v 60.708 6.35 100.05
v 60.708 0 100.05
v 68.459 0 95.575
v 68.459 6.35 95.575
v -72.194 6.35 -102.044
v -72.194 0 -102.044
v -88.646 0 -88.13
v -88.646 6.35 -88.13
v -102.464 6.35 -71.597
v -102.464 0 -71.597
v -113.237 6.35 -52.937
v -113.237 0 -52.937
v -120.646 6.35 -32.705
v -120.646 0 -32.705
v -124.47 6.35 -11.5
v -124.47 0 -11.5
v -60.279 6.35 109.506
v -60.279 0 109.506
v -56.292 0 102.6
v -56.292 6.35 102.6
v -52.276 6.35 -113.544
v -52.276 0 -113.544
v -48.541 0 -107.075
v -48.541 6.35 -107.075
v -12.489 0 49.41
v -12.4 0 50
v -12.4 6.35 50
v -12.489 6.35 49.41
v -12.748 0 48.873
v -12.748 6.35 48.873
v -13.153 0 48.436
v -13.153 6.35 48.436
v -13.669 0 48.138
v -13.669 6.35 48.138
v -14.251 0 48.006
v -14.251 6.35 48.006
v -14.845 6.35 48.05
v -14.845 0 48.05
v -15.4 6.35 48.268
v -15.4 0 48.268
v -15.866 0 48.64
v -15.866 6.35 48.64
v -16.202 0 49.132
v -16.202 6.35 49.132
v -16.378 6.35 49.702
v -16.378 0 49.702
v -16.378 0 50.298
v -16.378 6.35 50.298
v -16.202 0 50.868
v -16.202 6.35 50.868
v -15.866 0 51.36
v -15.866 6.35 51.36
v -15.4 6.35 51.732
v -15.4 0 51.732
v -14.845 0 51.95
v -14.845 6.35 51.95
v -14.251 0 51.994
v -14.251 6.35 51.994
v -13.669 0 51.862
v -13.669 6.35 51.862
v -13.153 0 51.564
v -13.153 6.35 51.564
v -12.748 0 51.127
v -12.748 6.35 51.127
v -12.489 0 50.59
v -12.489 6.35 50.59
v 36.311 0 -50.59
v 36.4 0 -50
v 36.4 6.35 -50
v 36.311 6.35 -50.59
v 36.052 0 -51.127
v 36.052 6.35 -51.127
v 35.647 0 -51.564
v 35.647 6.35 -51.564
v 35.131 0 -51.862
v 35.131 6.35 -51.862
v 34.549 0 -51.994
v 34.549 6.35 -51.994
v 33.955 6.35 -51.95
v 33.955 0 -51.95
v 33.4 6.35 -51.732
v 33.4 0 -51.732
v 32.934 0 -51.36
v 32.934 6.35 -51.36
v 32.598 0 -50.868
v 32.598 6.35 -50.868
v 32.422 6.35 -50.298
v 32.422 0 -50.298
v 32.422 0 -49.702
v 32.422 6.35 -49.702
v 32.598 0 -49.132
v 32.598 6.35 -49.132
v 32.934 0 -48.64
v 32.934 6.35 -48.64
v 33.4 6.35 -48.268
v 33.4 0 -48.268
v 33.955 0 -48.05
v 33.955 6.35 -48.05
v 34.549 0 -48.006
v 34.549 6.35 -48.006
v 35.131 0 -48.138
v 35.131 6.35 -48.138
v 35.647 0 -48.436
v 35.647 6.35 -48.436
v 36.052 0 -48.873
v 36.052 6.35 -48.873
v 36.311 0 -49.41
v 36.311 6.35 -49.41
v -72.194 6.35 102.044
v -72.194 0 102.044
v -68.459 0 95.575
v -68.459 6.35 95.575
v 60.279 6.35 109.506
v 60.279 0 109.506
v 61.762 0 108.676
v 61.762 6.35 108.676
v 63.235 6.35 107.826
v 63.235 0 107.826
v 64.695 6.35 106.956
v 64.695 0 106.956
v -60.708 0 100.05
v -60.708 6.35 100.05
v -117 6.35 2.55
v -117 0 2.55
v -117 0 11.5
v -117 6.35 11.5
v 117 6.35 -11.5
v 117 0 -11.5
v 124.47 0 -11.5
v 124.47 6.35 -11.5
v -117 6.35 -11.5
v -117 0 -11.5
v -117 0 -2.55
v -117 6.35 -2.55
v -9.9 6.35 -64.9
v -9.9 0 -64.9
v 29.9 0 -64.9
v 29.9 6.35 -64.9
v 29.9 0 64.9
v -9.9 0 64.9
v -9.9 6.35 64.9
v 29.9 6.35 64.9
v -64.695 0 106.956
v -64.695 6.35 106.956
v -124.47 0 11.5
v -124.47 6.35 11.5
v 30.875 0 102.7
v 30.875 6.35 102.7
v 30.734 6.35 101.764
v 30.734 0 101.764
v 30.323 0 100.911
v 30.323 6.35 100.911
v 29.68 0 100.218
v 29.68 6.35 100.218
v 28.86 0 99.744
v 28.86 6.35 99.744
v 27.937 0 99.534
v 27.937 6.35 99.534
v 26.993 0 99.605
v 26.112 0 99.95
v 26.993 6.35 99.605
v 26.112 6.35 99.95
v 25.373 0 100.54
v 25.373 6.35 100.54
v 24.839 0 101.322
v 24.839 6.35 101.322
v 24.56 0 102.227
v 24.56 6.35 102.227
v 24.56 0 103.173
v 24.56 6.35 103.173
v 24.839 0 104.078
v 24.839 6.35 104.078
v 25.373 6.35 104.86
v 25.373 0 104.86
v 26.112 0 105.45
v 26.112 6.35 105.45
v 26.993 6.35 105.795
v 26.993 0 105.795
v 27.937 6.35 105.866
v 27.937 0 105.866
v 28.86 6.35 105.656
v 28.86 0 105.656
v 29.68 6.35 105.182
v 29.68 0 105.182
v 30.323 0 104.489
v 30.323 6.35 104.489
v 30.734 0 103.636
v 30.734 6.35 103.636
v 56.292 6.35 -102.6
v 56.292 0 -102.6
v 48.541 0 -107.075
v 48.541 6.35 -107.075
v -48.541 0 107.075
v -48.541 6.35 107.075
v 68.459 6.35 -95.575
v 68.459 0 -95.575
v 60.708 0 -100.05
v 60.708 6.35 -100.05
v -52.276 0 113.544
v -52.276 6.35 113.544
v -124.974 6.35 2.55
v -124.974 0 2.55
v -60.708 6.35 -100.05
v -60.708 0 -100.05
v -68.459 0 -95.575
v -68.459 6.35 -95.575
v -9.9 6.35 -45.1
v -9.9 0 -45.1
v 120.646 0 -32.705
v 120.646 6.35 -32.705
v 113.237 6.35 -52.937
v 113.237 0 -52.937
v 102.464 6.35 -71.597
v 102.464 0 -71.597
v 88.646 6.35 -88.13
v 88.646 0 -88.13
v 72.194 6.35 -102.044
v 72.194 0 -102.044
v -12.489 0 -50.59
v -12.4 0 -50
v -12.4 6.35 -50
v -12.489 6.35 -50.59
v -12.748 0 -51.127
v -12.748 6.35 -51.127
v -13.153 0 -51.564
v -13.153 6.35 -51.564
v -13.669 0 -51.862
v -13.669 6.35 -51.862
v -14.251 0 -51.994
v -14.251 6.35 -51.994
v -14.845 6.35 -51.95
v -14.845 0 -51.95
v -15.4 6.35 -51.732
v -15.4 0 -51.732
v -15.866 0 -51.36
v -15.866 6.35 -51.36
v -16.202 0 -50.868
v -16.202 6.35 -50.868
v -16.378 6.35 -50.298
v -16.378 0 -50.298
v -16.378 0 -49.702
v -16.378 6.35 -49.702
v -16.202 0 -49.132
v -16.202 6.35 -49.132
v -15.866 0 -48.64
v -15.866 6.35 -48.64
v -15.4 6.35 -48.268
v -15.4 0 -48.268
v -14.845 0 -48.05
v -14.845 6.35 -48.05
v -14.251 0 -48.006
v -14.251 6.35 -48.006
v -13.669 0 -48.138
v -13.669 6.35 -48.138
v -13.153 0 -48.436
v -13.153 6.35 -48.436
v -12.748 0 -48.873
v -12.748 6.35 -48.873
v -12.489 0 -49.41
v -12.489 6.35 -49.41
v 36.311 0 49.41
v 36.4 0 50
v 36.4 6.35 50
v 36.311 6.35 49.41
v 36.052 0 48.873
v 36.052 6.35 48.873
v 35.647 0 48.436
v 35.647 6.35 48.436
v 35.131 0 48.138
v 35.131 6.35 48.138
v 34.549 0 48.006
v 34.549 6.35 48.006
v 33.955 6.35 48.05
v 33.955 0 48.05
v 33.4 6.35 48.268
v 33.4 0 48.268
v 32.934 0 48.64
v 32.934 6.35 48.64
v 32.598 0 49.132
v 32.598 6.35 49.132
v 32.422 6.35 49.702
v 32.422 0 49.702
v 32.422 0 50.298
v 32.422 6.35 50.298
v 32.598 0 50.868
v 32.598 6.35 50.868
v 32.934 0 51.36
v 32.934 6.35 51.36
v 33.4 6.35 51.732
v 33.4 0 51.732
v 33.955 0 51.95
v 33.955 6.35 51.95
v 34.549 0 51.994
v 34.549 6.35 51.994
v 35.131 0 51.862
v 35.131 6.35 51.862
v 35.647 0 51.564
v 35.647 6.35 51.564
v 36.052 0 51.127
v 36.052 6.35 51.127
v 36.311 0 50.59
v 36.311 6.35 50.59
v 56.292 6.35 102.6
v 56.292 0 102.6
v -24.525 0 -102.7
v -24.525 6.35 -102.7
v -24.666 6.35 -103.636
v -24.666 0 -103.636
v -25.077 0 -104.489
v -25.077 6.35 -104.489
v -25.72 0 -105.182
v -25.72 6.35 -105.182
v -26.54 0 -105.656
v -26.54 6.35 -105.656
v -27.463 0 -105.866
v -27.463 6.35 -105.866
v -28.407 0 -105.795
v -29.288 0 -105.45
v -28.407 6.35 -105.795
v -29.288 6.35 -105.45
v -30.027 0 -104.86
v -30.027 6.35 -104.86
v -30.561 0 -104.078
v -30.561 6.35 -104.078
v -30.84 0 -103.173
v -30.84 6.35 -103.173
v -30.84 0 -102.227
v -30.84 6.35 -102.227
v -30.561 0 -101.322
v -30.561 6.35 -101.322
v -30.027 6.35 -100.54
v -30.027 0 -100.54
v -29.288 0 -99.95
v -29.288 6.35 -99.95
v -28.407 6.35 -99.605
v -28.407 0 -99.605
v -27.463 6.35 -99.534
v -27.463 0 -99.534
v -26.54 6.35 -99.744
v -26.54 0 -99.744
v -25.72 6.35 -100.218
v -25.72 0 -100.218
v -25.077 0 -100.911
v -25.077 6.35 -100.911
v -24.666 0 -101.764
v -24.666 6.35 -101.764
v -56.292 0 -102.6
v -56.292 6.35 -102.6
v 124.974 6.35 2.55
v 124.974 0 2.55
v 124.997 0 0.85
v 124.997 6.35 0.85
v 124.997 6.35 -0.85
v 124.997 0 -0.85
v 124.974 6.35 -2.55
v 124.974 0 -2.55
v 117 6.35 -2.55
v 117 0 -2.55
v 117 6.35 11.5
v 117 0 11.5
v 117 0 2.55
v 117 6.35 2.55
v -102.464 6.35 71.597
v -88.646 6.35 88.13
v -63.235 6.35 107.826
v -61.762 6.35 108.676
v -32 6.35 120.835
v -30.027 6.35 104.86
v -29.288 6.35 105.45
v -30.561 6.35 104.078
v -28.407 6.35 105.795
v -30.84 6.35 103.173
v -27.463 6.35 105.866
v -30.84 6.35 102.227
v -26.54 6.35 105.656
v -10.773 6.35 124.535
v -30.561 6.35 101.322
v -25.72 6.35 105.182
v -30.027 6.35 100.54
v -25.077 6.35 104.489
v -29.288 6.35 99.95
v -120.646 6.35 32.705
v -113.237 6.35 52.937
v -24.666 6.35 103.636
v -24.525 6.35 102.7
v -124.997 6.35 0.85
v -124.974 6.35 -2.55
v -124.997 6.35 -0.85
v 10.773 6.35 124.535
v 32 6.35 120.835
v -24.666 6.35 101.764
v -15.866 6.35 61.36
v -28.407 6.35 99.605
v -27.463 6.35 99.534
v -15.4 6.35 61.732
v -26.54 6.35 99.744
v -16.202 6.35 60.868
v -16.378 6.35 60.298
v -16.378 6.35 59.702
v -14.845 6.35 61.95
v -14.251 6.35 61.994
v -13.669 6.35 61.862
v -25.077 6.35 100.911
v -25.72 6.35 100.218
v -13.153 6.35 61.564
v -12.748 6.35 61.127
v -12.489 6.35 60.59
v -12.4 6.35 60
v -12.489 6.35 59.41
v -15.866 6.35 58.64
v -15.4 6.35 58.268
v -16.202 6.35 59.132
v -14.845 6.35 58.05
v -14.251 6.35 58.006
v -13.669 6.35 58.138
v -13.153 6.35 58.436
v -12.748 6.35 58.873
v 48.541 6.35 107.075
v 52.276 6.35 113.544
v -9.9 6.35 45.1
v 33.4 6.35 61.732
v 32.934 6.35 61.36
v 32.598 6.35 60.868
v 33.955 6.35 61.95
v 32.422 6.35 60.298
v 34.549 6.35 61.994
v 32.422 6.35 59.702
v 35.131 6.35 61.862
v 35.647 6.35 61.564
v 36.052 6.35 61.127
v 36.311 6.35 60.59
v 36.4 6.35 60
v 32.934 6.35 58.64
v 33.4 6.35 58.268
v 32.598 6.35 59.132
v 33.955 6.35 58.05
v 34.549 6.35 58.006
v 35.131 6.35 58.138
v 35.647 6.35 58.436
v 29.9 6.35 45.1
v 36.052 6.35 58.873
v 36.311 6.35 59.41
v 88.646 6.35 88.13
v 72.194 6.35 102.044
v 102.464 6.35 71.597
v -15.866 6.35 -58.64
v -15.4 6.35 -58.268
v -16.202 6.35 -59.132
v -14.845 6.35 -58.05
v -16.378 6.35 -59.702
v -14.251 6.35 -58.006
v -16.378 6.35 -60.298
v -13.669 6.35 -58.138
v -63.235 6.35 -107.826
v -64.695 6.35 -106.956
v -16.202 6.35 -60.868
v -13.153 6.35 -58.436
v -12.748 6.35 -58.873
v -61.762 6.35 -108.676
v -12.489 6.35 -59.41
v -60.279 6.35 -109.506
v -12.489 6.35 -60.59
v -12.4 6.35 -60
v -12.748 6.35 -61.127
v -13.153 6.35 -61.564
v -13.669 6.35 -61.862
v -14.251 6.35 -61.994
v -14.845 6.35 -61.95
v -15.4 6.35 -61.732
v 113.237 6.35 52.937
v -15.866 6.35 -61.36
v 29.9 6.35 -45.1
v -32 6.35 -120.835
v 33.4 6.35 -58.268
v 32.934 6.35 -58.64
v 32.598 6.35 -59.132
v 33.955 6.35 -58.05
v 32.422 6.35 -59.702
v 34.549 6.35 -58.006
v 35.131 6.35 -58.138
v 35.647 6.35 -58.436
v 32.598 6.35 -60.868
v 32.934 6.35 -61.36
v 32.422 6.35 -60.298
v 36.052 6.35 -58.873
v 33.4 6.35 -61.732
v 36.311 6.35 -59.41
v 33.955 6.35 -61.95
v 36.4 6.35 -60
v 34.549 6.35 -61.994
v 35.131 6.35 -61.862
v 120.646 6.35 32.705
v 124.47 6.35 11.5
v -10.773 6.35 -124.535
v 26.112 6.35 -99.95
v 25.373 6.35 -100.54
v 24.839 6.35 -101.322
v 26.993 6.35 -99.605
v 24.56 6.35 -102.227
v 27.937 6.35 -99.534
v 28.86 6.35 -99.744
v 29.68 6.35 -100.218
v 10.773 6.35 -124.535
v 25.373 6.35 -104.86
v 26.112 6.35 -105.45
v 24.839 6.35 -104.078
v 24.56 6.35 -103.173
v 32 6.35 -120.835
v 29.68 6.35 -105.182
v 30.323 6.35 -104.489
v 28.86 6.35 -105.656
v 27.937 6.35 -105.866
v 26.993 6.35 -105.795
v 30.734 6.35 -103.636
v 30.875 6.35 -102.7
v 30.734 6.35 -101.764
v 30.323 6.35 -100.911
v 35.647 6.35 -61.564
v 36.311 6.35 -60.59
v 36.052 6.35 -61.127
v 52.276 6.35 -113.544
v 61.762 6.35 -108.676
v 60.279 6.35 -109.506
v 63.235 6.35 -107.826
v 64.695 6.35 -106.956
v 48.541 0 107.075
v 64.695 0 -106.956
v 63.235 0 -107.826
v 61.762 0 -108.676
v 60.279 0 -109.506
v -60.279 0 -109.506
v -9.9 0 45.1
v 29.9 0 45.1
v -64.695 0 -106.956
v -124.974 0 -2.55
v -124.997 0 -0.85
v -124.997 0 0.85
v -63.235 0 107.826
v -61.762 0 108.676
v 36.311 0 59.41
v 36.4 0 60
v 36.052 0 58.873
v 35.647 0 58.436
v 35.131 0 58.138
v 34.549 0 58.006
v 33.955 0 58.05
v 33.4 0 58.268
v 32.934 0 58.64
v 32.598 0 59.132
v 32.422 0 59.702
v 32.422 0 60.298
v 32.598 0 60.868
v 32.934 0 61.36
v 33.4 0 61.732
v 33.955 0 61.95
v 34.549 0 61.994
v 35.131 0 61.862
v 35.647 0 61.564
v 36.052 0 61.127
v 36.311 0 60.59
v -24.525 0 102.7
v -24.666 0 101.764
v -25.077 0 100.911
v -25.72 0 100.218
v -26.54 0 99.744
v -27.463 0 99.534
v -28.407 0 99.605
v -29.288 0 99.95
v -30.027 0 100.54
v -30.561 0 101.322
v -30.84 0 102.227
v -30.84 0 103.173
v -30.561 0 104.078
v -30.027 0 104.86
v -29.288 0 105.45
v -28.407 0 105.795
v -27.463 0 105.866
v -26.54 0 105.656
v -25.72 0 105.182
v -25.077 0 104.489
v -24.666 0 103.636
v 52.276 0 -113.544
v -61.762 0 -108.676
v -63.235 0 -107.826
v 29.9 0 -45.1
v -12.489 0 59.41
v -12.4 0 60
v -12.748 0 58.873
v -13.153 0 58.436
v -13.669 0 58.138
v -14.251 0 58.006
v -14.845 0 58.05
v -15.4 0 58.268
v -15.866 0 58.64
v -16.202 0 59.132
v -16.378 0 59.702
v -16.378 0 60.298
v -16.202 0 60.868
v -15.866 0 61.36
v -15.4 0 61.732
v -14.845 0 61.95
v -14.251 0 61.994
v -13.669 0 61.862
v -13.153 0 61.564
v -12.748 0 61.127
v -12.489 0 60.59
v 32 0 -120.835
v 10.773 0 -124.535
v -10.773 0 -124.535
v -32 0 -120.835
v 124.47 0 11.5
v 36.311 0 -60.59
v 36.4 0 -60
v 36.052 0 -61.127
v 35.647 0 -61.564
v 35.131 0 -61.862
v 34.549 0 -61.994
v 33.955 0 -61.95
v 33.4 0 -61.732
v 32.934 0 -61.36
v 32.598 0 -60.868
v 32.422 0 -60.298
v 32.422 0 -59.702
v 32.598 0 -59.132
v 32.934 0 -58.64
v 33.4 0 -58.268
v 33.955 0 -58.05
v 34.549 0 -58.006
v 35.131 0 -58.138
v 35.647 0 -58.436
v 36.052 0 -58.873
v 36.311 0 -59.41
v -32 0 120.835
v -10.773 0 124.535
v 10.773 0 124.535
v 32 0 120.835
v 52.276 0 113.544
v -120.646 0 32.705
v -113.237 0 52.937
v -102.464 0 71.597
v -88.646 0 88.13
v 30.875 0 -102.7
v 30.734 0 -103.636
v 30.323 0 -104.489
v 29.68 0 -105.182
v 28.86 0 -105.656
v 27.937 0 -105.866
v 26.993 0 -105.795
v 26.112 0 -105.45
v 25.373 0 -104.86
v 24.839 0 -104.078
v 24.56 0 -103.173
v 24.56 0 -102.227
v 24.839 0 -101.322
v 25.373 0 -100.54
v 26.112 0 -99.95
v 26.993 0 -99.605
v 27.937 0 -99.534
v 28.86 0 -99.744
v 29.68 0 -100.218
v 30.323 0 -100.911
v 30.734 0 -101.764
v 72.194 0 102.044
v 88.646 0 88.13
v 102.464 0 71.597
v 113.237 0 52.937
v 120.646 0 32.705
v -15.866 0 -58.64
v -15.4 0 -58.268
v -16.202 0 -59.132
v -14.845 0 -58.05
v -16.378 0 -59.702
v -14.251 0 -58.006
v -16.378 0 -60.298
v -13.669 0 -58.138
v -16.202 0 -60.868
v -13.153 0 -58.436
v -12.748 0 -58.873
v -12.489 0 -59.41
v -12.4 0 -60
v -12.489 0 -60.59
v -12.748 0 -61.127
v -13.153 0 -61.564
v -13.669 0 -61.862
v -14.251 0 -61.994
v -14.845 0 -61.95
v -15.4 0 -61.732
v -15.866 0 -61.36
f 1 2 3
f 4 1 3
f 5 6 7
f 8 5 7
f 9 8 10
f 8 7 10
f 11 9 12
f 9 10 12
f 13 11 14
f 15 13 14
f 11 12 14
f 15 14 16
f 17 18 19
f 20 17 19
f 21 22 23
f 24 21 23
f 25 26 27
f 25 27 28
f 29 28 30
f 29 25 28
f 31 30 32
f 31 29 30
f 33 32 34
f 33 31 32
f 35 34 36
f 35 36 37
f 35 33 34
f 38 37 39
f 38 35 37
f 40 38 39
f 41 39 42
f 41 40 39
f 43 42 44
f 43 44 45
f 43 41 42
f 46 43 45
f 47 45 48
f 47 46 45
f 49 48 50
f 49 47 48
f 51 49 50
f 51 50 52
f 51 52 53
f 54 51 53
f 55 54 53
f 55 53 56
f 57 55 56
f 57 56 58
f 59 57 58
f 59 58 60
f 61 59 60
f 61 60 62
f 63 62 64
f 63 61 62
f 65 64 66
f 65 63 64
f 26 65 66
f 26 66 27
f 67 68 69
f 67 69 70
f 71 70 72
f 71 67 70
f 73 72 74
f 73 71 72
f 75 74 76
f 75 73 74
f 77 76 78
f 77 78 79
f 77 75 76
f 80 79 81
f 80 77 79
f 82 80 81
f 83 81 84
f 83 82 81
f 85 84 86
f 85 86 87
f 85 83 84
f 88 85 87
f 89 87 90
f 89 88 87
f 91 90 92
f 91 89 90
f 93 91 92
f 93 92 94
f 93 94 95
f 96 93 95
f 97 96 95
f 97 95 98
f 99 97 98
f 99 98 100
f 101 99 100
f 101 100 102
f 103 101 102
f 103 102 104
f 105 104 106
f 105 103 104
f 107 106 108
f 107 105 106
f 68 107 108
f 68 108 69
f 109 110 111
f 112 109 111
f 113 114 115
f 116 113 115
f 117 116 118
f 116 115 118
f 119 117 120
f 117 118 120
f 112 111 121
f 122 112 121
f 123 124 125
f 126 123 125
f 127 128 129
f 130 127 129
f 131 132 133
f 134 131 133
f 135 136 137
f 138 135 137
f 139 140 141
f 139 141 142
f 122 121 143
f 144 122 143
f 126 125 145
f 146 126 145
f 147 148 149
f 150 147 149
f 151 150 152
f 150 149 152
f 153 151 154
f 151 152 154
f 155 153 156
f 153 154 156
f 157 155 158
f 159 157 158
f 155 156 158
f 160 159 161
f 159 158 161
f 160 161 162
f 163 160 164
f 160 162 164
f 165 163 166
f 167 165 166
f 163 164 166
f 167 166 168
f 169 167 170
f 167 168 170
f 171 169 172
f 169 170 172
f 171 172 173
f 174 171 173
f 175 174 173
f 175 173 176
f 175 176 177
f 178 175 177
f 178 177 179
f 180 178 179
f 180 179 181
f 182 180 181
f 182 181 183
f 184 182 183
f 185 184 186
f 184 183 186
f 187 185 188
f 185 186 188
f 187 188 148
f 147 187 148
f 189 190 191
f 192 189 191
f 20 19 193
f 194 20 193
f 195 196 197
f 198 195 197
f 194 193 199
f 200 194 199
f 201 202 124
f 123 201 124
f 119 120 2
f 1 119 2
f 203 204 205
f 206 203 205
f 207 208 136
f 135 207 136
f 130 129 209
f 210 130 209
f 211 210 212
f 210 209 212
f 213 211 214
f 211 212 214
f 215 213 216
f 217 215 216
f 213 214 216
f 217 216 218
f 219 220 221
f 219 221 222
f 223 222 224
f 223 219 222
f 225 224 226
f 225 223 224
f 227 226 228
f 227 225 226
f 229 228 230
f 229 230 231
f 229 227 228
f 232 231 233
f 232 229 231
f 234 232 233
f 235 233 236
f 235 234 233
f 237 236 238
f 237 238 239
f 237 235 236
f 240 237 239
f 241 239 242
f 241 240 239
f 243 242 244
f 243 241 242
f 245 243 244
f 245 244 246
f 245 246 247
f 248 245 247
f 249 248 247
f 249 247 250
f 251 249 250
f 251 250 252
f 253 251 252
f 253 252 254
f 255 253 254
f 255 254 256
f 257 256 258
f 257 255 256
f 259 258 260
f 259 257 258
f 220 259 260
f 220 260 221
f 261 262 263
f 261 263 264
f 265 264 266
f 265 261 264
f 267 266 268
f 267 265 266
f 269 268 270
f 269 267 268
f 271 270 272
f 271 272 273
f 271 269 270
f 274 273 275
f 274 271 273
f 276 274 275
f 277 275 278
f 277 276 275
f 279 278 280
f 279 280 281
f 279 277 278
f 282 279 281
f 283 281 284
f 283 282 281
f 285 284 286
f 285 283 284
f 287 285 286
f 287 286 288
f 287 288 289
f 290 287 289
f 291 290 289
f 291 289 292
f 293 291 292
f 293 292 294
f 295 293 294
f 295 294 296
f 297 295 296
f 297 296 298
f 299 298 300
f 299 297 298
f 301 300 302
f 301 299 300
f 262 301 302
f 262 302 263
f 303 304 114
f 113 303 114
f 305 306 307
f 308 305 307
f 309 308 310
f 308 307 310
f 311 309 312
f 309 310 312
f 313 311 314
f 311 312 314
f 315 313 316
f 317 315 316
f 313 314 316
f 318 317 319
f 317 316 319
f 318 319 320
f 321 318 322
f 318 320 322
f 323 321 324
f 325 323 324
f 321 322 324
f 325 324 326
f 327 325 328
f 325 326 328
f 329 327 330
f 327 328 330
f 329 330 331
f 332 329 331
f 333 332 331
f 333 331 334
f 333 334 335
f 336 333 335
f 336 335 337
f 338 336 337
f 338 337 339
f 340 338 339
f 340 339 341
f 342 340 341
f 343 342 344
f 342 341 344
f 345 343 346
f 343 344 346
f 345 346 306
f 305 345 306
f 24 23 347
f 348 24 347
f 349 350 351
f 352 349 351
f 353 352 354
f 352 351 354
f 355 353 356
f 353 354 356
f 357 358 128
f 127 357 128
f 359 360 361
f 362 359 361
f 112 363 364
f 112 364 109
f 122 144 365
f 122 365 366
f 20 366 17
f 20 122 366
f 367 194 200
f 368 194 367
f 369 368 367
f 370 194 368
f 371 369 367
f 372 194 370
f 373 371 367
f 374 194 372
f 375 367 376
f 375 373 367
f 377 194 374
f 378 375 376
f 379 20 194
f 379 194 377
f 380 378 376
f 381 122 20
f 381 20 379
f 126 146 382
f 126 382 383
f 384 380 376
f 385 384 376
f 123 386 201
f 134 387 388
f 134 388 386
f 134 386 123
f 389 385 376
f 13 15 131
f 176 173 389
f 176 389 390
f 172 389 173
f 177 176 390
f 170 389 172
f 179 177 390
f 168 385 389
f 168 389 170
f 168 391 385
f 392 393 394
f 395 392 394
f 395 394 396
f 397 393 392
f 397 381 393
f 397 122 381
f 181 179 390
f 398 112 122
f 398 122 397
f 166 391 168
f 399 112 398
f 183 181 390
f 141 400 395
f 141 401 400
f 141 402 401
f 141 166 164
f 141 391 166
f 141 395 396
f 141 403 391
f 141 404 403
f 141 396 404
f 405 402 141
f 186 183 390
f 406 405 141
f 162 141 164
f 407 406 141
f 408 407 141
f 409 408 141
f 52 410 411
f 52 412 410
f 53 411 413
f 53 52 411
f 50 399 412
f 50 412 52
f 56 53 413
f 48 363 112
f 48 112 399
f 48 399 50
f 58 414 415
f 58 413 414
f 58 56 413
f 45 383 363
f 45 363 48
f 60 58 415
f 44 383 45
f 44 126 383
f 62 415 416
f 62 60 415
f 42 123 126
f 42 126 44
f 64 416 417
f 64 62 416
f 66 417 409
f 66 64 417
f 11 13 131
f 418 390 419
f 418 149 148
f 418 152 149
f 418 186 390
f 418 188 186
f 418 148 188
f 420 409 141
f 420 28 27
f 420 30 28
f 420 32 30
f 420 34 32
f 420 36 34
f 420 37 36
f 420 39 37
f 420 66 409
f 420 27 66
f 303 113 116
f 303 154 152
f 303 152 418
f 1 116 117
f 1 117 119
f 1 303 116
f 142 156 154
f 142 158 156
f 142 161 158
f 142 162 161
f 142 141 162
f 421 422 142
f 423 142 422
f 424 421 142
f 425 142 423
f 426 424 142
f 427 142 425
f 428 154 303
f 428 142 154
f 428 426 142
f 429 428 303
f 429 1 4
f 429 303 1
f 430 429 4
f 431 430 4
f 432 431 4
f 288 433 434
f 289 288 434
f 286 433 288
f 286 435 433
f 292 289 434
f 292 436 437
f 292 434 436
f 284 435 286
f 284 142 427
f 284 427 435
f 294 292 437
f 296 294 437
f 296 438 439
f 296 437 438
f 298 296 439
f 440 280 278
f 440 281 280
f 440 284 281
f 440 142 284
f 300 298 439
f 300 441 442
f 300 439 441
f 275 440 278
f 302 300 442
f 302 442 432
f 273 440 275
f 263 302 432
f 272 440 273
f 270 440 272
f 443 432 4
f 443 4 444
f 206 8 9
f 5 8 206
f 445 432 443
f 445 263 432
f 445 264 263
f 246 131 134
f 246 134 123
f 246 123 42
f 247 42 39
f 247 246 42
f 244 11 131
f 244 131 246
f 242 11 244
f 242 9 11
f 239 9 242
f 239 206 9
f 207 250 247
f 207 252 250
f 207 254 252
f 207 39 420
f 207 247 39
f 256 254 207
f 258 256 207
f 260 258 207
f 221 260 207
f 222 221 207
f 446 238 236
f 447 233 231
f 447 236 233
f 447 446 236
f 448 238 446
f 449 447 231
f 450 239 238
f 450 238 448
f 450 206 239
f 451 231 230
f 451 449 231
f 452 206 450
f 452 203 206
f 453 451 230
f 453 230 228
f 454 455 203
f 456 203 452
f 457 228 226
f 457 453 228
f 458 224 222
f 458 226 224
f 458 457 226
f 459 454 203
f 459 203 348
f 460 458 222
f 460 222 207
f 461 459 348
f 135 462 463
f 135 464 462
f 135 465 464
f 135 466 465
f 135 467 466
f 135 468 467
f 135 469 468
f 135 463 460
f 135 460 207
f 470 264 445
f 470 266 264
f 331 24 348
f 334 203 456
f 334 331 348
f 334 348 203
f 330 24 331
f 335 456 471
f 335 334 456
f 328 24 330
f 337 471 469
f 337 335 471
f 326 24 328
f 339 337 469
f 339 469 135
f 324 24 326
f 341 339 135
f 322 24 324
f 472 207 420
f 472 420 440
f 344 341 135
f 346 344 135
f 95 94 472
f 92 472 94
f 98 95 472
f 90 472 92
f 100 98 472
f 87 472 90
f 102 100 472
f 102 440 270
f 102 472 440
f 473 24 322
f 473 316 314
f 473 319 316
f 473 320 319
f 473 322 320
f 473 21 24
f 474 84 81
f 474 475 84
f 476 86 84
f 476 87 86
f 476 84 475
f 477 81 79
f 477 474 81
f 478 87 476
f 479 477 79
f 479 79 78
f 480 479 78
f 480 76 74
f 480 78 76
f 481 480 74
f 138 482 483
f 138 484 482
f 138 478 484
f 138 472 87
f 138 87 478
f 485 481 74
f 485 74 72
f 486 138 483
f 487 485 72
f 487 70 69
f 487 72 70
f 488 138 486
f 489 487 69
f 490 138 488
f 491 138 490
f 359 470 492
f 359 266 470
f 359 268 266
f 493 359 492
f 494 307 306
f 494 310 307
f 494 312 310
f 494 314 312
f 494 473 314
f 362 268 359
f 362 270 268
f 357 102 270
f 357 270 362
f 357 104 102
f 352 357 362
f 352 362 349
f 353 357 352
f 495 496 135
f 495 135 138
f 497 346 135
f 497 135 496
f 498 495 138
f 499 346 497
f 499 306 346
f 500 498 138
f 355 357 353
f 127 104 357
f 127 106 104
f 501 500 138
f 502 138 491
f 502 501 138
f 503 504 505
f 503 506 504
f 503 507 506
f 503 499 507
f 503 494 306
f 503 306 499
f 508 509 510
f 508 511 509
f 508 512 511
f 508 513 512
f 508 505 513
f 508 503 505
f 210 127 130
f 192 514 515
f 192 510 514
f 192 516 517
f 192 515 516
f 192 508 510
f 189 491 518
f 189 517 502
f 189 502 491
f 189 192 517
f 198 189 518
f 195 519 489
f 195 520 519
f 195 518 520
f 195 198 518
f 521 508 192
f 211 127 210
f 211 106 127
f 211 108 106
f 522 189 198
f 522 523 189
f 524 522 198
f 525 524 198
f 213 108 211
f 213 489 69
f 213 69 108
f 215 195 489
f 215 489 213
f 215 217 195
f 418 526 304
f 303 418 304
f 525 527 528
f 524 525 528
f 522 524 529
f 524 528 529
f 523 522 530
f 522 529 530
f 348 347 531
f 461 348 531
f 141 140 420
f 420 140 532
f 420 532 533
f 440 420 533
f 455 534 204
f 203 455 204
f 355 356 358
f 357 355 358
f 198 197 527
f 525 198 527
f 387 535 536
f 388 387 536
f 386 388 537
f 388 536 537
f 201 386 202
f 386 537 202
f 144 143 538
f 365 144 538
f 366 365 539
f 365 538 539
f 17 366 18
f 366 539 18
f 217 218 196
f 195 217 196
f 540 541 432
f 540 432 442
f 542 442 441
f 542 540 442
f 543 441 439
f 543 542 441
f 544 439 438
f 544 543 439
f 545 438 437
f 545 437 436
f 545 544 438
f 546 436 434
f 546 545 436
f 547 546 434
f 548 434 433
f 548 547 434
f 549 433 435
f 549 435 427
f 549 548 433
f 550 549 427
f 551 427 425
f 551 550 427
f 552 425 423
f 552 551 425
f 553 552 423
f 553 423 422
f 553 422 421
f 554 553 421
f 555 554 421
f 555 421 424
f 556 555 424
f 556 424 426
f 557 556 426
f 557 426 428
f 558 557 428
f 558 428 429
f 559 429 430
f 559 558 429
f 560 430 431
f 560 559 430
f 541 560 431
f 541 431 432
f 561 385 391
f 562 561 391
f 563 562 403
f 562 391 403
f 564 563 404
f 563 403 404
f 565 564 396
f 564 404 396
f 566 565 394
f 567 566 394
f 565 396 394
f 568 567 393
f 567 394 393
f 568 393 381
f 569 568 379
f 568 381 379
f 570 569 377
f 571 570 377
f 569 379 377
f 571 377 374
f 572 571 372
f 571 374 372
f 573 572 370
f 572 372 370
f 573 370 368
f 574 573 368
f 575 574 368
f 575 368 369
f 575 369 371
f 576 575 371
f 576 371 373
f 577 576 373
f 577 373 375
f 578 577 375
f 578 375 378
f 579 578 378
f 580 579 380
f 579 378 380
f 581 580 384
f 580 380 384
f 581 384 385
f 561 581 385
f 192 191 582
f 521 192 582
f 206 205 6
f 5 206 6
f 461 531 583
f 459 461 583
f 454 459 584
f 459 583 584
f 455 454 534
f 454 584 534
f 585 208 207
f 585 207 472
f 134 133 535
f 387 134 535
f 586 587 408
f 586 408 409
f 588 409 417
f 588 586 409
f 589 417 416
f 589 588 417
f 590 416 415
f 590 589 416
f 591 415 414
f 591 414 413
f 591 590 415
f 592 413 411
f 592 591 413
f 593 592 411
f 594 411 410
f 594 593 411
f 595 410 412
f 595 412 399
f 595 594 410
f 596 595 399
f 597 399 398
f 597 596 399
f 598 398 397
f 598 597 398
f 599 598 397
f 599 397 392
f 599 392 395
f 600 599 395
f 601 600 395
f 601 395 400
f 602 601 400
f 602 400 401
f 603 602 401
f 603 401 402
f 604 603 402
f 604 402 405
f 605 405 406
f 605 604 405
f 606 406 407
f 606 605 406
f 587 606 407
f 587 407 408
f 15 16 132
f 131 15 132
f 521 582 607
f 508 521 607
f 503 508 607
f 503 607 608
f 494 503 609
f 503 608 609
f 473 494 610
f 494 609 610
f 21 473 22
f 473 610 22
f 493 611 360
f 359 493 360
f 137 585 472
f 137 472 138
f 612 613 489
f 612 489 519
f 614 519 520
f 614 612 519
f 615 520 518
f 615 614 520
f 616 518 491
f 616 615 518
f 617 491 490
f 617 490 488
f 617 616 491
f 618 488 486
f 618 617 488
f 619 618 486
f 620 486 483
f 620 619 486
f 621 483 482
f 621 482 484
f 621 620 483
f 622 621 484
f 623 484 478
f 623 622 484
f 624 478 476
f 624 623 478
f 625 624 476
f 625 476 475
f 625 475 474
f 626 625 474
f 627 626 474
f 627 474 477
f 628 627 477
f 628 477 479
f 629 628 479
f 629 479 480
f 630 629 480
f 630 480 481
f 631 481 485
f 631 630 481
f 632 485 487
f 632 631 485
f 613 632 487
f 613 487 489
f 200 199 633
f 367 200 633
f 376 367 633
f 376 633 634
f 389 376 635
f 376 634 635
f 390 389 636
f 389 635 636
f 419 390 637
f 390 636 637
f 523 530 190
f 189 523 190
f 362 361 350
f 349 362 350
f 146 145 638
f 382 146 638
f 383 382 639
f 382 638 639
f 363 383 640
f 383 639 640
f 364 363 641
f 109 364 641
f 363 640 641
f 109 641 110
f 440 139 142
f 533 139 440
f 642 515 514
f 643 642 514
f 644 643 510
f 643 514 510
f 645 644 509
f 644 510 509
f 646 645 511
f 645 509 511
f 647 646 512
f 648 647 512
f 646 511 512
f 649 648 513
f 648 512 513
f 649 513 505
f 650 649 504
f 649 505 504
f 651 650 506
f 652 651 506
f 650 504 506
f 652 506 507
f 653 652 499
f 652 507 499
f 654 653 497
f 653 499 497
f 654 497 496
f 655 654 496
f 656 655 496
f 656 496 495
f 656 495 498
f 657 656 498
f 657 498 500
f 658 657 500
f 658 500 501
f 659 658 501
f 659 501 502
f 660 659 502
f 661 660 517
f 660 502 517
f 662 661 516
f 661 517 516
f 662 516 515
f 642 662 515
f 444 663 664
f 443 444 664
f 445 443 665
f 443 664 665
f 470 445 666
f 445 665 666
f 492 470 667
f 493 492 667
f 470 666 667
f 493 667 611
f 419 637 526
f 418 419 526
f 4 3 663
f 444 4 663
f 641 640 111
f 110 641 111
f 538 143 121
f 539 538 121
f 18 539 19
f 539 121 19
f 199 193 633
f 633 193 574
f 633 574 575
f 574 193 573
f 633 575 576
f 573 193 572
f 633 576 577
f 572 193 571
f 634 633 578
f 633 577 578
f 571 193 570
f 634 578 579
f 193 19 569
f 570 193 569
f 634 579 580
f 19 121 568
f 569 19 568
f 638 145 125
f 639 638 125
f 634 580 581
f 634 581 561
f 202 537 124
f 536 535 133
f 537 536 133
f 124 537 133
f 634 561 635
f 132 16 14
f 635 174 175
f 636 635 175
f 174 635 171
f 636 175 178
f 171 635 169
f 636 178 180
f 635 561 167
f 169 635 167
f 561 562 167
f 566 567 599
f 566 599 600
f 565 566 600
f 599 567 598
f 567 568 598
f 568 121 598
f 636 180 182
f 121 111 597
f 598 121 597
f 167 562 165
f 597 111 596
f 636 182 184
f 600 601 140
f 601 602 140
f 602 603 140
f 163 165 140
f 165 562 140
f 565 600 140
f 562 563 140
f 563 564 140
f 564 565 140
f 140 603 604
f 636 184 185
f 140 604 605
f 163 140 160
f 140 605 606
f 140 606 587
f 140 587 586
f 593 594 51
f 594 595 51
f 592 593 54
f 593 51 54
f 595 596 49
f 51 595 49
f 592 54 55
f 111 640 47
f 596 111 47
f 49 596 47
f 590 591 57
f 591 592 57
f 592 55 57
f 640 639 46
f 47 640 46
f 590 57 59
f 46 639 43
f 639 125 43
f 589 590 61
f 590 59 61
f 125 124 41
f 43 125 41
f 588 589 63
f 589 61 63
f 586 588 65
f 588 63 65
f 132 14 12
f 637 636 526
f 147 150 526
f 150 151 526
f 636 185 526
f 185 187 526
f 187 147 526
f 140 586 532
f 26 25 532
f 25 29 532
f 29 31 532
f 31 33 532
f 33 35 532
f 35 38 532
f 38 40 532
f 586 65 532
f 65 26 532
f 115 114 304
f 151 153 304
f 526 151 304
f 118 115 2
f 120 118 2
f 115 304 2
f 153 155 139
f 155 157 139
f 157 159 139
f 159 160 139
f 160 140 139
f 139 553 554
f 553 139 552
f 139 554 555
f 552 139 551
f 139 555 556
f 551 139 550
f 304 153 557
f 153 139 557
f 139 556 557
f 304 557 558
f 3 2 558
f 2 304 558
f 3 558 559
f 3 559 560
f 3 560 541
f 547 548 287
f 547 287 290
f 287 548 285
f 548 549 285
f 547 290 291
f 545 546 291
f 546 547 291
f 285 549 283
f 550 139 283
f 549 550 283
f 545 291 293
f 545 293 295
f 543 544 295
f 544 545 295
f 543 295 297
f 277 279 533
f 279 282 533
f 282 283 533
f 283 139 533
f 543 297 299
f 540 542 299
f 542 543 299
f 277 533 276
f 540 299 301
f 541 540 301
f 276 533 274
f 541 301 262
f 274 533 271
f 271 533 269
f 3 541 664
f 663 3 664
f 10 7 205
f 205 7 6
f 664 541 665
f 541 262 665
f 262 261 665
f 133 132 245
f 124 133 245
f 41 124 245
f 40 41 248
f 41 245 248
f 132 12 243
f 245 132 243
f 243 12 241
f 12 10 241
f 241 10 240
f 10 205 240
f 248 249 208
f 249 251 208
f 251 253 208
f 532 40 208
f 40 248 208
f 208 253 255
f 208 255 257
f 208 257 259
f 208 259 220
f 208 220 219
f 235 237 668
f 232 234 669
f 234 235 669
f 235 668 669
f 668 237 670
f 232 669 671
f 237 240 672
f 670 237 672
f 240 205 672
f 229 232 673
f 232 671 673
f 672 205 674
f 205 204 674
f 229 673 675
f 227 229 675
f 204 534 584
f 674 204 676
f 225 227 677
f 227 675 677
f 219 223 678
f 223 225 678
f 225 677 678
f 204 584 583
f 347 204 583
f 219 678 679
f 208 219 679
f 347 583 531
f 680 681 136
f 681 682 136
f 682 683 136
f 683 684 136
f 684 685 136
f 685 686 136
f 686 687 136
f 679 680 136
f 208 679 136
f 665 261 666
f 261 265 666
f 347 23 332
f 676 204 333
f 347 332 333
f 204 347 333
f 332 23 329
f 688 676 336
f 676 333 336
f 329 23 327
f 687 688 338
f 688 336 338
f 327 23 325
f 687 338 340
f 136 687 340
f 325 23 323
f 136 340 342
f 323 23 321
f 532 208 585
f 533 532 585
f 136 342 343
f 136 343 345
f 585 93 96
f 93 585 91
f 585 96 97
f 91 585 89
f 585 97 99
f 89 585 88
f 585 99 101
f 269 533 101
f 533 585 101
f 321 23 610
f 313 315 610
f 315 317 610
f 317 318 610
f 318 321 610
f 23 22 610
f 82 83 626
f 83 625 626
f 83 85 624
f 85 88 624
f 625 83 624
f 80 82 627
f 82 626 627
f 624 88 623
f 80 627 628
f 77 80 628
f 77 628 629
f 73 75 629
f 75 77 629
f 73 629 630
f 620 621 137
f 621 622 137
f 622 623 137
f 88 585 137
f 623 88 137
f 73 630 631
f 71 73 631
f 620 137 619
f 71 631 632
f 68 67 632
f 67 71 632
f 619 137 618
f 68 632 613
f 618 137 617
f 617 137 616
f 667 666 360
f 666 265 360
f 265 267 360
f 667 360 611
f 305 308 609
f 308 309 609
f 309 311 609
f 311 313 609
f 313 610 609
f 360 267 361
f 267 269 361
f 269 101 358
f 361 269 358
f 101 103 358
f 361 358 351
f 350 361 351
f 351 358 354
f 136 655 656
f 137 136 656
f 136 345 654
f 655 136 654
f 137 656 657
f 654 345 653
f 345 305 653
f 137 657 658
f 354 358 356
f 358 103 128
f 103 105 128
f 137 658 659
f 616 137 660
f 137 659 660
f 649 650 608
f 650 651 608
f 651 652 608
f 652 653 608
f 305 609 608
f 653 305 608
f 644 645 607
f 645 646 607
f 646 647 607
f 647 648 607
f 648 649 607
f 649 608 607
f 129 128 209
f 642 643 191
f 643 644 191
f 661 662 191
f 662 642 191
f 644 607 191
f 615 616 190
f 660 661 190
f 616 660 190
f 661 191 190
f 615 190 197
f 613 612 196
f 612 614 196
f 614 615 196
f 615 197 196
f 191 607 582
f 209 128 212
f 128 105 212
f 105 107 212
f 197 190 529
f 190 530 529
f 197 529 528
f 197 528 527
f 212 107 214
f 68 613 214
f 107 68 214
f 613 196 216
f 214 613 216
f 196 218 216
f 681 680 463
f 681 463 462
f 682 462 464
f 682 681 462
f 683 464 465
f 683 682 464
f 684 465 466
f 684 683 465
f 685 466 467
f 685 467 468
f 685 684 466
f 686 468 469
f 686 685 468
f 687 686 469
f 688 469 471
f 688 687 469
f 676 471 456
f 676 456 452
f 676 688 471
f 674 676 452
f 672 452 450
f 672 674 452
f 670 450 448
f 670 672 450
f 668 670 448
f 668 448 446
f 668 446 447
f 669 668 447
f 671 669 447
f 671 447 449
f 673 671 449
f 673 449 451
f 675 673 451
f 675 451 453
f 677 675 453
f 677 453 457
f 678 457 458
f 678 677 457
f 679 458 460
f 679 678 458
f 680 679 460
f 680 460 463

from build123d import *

# Parameters (mm, degrees)
SKETCH1_R           = 2
SKETCH1_W           = 39.8
SKETCH1_H           = 19.8
BOSS_EXTRUDE1_DEPTH = 6.35
SKETCH3_R           = 3.175
CUT_EXTRUDE1_DEPTH  = 6.35


with BuildPart() as part:
    # Sketch1 → Boss-Extrude1 (new body)
    with BuildSketch(Plane(origin=(0, 0, 0), x_dir=(1, 0, 0), z_dir=(0, 1, 0))):
        with BuildLine():
            Line((-124.469875874, 11.5), (-117, 11.5))
            Line((-117, 11.5), (-117, 2.55))
            Line((-117, 2.55), (-124.973987293, 2.55))
            ThreePointArc((-124.973987293, 2.55), (-125, 0), (-124.973987293, -2.55))
            Line((-124.973987293, -2.55), (-117, -2.55))
            Line((-117, -2.55), (-117, -11.5))
            Line((-117, -11.5), (-124.469875874, -11.5))
            ThreePointArc((-124.469875874, -11.5), (-108.253175473, -62.5), (-72.19423008, -102.044074512))
            Line((-72.19423008, -102.044074512), (-68.459292144, -95.574972243))
            Line((-68.459292144, -95.574972243), (-60.70836478, -100.049972243))
            Line((-60.70836478, -100.049972243), (-64.695358426, -106.955647808))
            ThreePointArc((-64.695358426, -106.955647808), (-62.5, -108.253175473), (-60.278628867, -109.505647808))
            Line((-60.278628867, -109.505647808), (-56.29163522, -102.599972243))
            Line((-56.29163522, -102.599972243), (-48.540707856, -107.074972243))
            Line((-48.540707856, -107.074972243), (-52.275645793, -113.544074512))
            ThreePointArc((-52.275645793, -113.544074512), (0, -125), (52.275645793, -113.544074512))
            Line((52.275645793, -113.544074512), (48.540707856, -107.074972243))
            Line((48.540707856, -107.074972243), (56.29163522, -102.599972243))
            Line((56.29163522, -102.599972243), (60.278628867, -109.505647808))
            ThreePointArc((60.278628867, -109.505647808), (62.5, -108.253175473), (64.695358426, -106.955647808))
            Line((64.695358426, -106.955647808), (60.70836478, -100.049972243))
            Line((60.70836478, -100.049972243), (68.459292144, -95.574972243))
            Line((68.459292144, -95.574972243), (72.19423008, -102.044074512))
            ThreePointArc((72.19423008, -102.044074512), (108.253175473, -62.5), (124.469875874, -11.5))
            Line((124.469875874, -11.5), (117, -11.5))
            Line((117, -11.5), (117, -2.55))
            Line((117, -2.55), (124.973987293, -2.55))
            ThreePointArc((124.973987293, -2.55), (125, 0), (124.973987293, 2.55))
            Line((124.973987293, 2.55), (117, 2.55))
            Line((117, 2.55), (117, 11.5))
            Line((117, 11.5), (124.469875874, 11.5))
            ThreePointArc((124.469875874, 11.5), (108.253175473, 62.5), (72.19423008, 102.044074512))
            Line((72.19423008, 102.044074512), (68.459292144, 95.574972243))
            Line((68.459292144, 95.574972243), (60.70836478, 100.049972243))
            Line((60.70836478, 100.049972243), (64.695358426, 106.955647808))
            ThreePointArc((64.695358426, 106.955647808), (62.5, 108.253175473), (60.278628867, 109.505647808))
            Line((60.278628867, 109.505647808), (56.29163522, 102.599972243))
            Line((56.29163522, 102.599972243), (48.540707856, 107.074972243))
            Line((48.540707856, 107.074972243), (52.275645793, 113.544074512))
            ThreePointArc((52.275645793, 113.544074512), (0, 125), (-52.275645793, 113.544074512))
            Line((-52.275645793, 113.544074512), (-48.540707856, 107.074972243))
            Line((-48.540707856, 107.074972243), (-56.29163522, 102.599972243))
            Line((-56.29163522, 102.599972243), (-60.278628867, 109.505647808))
            ThreePointArc((-60.278628867, 109.505647808), (-62.5, 108.253175473), (-64.695358426, 106.955647808))
            Line((-64.695358426, 106.955647808), (-60.70836478, 100.049972243))
            Line((-60.70836478, 100.049972243), (-68.459292144, 95.574972243))
            Line((-68.459292144, 95.574972243), (-72.19423008, 102.044074512))
            ThreePointArc((-72.19423008, 102.044074512), (-108.253175473, 62.5), (-124.469875874, 11.5))
        make_face()
        with Locations((34.4, 60)):
            Circle(SKETCH1_R, mode=Mode.SUBTRACT)
        with Locations((34.4, 50)):
            Circle(SKETCH1_R, mode=Mode.SUBTRACT)
        with Locations((-14.4, 60)):
            Circle(SKETCH1_R, mode=Mode.SUBTRACT)
        with Locations((-14.4, 50)):
            Circle(SKETCH1_R, mode=Mode.SUBTRACT)
        with Locations((-14.4, -60)):
            Circle(SKETCH1_R, mode=Mode.SUBTRACT)
        with Locations((-14.4, -50)):
            Circle(SKETCH1_R, mode=Mode.SUBTRACT)
        with Locations((34.4, -60)):
            Circle(SKETCH1_R, mode=Mode.SUBTRACT)
        with Locations((34.4, -50)):
            Circle(SKETCH1_R, mode=Mode.SUBTRACT)
        with Locations((10, 55)):
            Rectangle(SKETCH1_W, SKETCH1_H, mode=Mode.SUBTRACT)
        with Locations((10, -55)):
            Rectangle(SKETCH1_W, SKETCH1_H, mode=Mode.SUBTRACT)
    extrude(amount=BOSS_EXTRUDE1_DEPTH)

    # Sketch3 → Cut-Extrude1 (cut)
    with BuildSketch(Plane(origin=(0, 6.35, 0), x_dir=(1, 0, 0), z_dir=(0, 1, 0))):
        with Locations((-27.7, -102.7)):
            Circle(SKETCH3_R)
        with Locations((27.7, -102.7)):
            Circle(SKETCH3_R)
        with Locations((27.7, 102.7)):
            Circle(SKETCH3_R)
        with Locations((-27.7, 102.7)):
            Circle(SKETCH3_R)
    extrude(amount=-CUT_EXTRUDE1_DEPTH, mode=Mode.SUBTRACT)


solid = part.part
